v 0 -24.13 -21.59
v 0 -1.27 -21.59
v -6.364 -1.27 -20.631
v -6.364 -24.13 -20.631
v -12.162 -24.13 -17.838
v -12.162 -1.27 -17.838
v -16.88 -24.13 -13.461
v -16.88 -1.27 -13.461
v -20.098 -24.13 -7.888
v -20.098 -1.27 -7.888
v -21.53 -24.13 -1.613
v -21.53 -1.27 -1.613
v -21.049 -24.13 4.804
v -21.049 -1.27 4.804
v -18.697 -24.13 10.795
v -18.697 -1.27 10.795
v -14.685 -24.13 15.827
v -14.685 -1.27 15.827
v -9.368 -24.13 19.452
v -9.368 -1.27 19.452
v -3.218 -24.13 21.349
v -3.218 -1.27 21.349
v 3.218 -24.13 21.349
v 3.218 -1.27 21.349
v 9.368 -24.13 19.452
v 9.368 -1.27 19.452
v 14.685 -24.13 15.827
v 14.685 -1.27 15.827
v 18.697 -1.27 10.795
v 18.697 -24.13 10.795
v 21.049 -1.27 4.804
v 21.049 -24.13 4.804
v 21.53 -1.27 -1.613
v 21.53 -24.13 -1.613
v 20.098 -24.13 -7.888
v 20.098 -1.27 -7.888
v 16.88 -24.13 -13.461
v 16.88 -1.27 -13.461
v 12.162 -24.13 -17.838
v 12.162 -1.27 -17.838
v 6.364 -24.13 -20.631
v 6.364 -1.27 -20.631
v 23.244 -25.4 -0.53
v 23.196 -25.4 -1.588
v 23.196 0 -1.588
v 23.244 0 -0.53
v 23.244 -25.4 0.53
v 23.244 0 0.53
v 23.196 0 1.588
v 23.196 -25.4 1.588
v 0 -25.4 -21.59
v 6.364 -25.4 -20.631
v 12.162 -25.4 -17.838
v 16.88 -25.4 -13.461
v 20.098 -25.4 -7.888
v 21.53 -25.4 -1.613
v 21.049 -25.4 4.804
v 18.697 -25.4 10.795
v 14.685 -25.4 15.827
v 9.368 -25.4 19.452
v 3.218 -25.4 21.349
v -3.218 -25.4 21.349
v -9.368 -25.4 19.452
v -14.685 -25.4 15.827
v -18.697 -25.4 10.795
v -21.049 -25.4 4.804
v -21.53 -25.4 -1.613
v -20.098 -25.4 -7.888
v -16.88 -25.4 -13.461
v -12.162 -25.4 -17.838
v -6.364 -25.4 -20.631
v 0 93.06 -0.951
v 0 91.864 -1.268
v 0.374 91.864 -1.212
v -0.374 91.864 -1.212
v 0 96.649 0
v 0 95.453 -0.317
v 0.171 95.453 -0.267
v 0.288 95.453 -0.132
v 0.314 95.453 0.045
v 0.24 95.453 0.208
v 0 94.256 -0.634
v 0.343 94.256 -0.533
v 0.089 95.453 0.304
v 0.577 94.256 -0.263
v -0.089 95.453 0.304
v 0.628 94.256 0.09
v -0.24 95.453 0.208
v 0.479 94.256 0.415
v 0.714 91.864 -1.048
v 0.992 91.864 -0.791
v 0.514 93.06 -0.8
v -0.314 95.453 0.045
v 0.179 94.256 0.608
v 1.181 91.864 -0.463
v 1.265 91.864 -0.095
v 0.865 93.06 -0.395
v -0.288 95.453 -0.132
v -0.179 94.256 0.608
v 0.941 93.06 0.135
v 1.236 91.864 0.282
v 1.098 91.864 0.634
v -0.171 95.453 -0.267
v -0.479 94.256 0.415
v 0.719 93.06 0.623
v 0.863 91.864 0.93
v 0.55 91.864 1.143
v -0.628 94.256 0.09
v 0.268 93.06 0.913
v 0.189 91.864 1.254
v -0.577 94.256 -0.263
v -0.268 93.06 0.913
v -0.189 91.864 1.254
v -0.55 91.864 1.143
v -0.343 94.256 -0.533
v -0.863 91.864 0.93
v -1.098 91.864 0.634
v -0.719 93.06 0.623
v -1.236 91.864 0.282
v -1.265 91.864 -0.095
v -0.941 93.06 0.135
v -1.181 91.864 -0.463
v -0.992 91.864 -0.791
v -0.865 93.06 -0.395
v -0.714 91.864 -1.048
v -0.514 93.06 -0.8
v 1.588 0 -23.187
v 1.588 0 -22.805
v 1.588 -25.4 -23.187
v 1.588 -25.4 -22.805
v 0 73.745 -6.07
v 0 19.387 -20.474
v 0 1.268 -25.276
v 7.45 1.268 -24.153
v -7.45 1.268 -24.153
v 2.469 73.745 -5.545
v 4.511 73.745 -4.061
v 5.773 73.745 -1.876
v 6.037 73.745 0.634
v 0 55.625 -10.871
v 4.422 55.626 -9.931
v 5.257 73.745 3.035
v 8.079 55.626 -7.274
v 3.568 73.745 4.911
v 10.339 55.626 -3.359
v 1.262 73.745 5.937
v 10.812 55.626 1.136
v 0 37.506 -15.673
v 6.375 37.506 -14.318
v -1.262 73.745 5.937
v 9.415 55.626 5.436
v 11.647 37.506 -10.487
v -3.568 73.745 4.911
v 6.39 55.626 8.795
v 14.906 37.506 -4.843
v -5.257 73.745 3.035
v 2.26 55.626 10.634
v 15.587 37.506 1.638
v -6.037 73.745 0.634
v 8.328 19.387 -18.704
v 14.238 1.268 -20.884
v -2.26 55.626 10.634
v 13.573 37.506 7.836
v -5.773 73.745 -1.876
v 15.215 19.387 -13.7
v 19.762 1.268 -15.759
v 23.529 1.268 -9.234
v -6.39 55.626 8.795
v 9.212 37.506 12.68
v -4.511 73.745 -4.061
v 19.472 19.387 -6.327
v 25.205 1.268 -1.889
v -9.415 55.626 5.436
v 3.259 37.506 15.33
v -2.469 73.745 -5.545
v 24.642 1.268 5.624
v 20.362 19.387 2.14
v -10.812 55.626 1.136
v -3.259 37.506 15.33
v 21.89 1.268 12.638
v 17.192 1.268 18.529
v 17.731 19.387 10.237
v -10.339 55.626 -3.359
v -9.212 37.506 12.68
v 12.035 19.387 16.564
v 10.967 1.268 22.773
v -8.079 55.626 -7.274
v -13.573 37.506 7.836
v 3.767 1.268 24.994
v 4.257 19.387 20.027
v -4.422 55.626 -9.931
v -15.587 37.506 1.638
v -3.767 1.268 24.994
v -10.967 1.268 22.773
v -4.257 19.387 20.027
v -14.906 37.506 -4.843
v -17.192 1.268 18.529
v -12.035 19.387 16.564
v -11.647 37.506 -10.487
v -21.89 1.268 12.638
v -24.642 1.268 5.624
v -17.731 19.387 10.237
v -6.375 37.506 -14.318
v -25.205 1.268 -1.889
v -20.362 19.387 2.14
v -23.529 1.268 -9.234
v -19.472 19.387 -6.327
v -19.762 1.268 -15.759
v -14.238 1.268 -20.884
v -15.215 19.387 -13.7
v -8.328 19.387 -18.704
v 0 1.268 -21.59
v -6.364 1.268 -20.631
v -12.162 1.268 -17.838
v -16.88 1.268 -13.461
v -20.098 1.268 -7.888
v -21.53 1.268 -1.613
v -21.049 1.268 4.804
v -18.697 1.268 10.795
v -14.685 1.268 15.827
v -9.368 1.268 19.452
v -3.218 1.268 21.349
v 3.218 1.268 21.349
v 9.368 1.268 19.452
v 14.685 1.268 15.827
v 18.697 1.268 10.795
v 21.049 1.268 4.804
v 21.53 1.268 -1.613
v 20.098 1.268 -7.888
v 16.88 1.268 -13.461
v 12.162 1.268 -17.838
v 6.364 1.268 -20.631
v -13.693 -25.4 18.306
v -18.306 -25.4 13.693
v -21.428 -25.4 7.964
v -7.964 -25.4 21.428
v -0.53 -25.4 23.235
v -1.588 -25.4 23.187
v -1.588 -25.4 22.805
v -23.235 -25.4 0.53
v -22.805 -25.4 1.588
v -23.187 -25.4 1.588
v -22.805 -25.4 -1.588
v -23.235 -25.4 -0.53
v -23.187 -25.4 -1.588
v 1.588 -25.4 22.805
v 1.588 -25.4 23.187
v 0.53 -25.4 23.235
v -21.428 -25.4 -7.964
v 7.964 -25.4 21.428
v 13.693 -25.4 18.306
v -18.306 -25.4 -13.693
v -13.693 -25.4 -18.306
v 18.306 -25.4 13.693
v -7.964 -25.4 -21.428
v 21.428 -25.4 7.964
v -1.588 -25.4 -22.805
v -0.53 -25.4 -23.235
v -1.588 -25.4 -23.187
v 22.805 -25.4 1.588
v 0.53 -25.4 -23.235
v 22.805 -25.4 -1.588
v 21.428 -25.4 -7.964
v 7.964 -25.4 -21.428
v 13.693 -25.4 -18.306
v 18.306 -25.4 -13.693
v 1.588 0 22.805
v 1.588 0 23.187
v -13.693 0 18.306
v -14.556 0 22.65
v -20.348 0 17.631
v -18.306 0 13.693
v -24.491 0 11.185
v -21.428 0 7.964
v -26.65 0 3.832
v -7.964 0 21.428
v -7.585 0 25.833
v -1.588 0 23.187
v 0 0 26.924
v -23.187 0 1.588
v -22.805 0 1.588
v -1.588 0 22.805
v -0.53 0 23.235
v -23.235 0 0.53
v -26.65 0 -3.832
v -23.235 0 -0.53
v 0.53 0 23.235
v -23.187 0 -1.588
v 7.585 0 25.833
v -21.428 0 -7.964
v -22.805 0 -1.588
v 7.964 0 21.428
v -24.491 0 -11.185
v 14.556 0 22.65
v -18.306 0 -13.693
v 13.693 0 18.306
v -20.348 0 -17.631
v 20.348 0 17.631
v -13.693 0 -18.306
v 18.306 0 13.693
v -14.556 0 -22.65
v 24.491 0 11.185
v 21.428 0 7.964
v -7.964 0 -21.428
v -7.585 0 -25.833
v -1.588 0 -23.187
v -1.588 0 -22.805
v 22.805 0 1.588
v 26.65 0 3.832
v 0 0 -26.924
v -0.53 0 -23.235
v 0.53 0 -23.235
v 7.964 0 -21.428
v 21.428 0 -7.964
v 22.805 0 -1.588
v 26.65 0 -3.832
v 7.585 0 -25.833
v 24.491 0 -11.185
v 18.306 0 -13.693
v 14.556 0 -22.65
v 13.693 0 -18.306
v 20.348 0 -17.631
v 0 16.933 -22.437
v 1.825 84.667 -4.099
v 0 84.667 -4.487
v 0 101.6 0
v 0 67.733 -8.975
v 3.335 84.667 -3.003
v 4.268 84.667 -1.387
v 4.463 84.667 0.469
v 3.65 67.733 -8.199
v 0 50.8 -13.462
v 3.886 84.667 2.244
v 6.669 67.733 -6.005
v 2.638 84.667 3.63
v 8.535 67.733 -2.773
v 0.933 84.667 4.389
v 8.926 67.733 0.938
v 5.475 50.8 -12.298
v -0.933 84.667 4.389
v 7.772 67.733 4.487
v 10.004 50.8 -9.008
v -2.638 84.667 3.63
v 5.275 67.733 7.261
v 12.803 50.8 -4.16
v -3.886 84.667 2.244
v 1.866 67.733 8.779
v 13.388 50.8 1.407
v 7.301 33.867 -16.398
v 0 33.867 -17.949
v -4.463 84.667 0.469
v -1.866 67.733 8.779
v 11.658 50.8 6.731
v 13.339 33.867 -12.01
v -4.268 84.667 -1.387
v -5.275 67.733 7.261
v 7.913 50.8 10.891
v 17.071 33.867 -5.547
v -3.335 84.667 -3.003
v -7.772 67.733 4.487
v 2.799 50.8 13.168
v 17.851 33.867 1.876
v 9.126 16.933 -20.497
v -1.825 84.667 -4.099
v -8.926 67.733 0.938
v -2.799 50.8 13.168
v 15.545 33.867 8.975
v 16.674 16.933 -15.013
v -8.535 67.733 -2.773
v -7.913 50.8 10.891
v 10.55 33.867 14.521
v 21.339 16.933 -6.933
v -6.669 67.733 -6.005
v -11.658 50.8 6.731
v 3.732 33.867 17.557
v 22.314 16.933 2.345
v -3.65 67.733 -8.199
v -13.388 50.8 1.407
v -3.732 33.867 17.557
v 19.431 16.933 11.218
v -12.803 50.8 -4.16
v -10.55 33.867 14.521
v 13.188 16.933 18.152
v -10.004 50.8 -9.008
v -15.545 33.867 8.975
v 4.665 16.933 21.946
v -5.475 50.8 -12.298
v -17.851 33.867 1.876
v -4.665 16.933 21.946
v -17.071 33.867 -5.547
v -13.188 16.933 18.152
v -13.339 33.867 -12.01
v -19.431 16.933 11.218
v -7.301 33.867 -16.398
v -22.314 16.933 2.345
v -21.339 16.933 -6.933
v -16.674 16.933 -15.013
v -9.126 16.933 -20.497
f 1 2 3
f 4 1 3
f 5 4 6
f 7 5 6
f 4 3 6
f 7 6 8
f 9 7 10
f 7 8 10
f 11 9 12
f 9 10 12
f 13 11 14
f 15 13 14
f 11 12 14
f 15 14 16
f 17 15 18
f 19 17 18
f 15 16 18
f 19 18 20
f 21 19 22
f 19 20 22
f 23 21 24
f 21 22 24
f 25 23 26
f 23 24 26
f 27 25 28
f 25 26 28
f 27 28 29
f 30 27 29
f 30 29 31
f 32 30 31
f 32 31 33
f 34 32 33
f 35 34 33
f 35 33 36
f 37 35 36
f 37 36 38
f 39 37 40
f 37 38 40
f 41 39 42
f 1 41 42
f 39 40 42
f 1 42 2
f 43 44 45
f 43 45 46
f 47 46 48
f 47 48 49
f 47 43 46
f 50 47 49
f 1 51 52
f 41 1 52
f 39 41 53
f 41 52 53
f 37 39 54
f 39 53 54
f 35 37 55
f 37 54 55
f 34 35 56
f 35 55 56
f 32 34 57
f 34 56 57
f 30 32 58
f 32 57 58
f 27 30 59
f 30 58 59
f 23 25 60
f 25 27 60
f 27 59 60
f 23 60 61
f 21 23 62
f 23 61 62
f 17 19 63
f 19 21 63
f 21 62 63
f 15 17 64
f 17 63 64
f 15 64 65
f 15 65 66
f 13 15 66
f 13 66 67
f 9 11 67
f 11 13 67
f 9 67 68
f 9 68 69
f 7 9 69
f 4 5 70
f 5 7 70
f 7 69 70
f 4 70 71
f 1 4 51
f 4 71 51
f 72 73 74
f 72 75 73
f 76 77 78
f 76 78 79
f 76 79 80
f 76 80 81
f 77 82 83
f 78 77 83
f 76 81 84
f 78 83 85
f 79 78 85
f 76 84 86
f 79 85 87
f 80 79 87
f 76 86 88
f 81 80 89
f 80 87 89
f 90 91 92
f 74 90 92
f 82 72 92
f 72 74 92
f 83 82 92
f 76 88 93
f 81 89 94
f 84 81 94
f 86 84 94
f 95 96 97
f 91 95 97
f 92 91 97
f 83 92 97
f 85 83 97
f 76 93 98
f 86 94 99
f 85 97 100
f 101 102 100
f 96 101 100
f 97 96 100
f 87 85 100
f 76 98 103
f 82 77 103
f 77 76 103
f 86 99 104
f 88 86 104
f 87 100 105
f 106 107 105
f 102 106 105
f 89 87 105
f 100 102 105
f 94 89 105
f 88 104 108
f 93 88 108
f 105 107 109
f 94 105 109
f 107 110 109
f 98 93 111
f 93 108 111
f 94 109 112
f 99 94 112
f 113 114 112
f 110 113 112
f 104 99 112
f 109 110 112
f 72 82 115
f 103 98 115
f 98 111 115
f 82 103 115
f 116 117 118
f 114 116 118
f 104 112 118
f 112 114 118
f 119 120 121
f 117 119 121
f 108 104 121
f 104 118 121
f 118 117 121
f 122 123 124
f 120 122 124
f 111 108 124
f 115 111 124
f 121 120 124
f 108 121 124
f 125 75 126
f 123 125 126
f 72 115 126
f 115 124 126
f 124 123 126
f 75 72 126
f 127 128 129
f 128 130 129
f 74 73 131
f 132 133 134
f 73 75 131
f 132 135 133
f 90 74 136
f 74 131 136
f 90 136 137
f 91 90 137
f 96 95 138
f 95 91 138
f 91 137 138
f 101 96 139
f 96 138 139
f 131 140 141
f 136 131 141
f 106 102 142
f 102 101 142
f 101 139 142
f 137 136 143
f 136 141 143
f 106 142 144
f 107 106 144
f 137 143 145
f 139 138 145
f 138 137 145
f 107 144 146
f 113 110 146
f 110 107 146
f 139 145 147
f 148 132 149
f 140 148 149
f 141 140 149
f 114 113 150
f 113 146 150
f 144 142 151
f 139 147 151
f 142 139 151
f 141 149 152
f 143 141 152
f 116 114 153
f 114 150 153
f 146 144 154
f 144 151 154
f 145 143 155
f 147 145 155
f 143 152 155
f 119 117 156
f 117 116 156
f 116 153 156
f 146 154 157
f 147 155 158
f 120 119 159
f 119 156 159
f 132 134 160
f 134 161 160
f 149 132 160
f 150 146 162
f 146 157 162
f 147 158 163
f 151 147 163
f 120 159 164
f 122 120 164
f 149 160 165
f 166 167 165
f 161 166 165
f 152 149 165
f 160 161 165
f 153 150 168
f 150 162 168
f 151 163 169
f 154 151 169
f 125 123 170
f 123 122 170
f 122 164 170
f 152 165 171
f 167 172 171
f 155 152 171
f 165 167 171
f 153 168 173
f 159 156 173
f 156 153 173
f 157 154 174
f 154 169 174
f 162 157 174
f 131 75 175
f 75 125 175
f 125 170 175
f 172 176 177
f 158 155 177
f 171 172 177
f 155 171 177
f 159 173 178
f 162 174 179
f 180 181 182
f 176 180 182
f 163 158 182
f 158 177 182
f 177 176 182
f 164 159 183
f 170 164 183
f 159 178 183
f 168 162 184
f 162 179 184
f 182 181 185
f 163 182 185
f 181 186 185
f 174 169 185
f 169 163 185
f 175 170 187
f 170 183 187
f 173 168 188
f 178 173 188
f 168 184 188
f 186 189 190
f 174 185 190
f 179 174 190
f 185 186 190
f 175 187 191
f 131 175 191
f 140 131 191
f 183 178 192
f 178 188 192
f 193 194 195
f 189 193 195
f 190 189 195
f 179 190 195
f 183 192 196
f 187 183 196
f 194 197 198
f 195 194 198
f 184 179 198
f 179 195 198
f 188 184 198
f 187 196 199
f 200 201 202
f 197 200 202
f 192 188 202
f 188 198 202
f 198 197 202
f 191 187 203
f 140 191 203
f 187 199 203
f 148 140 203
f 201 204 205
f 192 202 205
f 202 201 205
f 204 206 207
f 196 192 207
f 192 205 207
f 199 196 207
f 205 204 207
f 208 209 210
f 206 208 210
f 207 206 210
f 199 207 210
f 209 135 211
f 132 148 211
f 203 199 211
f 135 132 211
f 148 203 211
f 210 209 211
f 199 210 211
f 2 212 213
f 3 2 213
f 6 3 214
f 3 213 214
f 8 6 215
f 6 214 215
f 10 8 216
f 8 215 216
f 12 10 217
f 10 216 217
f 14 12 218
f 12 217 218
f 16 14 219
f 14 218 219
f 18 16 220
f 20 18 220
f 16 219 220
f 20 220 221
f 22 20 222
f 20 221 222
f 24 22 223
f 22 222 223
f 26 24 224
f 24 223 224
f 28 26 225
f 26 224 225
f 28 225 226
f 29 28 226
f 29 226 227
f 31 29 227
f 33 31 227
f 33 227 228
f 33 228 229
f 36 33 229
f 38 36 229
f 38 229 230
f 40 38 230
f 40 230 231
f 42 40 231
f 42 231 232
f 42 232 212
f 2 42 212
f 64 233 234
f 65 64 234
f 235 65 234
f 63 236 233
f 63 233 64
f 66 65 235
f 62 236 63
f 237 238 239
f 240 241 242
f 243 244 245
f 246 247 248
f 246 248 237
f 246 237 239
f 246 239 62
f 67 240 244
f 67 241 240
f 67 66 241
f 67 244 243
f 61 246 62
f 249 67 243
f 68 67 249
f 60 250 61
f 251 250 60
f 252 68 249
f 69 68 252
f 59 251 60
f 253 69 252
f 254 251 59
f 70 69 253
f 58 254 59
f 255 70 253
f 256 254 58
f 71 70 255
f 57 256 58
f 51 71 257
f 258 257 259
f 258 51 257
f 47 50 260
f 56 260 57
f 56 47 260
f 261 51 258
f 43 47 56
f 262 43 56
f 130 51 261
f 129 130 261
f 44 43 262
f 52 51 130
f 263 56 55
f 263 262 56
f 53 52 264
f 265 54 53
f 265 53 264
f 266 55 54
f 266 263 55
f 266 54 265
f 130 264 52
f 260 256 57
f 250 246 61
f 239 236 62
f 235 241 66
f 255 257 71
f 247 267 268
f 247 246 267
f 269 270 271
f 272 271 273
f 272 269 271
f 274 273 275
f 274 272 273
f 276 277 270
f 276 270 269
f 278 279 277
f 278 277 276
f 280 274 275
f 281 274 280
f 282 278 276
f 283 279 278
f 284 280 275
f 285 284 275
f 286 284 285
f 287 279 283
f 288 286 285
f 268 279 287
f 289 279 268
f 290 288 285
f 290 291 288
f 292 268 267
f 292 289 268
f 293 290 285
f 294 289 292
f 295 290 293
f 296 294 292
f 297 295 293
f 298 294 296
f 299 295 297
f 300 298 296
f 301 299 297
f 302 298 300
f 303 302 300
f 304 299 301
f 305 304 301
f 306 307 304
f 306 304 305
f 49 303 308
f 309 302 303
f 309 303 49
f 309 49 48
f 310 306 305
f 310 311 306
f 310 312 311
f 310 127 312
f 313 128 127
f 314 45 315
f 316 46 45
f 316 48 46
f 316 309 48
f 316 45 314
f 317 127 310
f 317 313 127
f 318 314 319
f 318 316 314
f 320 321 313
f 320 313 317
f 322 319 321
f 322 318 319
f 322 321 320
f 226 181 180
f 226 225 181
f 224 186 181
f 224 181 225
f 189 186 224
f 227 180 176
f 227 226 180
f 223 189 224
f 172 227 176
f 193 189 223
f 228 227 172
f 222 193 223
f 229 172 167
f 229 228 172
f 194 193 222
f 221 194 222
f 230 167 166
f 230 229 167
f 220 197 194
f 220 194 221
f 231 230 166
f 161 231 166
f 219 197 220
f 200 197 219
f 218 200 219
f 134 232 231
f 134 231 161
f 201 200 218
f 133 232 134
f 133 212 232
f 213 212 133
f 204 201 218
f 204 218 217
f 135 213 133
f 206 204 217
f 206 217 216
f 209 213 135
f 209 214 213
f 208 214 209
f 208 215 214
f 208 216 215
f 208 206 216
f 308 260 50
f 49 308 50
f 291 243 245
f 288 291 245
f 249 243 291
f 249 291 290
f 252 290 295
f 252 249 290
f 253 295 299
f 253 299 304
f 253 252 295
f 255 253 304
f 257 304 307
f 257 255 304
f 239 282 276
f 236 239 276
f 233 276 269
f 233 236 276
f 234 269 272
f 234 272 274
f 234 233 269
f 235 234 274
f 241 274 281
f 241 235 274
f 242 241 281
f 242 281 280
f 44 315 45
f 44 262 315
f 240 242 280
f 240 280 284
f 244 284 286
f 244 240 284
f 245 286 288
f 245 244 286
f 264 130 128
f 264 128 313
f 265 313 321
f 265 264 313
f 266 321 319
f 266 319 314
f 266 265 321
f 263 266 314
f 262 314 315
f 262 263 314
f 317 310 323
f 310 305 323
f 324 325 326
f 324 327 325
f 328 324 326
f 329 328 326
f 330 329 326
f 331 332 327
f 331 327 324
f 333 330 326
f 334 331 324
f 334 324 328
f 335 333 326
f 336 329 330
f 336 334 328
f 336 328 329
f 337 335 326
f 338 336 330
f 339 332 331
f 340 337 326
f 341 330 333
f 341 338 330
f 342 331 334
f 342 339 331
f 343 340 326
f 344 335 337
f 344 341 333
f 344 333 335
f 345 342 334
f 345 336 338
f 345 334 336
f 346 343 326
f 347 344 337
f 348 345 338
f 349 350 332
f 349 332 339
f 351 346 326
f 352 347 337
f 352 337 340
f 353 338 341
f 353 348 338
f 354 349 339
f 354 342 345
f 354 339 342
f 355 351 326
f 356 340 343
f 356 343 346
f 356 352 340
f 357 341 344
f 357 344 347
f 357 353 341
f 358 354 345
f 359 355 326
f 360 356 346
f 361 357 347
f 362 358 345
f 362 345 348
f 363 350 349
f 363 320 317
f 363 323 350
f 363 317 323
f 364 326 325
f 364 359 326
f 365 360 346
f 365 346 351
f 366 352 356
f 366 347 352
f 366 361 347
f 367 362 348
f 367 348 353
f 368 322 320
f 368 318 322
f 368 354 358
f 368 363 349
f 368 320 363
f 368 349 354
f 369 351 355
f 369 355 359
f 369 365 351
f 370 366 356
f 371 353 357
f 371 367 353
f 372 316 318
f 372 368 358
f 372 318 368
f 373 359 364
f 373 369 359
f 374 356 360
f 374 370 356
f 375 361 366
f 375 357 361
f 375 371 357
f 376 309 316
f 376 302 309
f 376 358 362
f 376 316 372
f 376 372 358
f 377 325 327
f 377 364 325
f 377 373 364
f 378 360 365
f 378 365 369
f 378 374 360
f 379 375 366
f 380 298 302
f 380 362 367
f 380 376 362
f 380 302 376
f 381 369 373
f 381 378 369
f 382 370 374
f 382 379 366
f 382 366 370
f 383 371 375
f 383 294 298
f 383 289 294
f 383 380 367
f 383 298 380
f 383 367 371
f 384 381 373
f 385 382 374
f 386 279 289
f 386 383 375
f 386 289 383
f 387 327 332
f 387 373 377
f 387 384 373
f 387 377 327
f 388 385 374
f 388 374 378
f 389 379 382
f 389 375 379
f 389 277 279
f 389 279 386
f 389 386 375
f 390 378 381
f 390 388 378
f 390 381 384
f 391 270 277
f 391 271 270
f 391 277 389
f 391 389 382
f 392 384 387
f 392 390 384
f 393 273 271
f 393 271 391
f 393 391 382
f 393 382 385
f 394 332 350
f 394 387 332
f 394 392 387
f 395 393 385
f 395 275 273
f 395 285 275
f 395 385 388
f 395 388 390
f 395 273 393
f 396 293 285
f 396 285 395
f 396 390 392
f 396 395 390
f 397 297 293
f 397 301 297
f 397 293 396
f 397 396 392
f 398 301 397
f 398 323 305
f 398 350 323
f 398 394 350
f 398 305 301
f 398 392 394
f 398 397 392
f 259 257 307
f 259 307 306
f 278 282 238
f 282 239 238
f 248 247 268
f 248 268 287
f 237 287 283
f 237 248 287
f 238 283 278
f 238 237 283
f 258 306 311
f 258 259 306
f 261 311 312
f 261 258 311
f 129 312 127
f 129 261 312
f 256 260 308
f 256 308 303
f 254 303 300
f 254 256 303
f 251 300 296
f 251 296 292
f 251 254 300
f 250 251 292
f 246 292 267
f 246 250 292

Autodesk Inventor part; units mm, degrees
ref_plane "YZ Plane" through (0, 0, 0) normal (1, 0, 0) x (0, 1, 0)
ref_plane "XZ Plane" through (0, 0, 0) normal (0, 1, 0) x (-1, 0, 0)
ref_plane "XY Plane" through (0, 0, 0) normal (0, 0, 1) x (1, 0, 0)
sketch "Sketch1" plane through (0, 0, 0) normal (1, 0, 0) x (0, 1, 0)
  line L0 (0, -22.86) -> (-25.4, -22.86)
  line L1 (-25.4, -22.86) -> (-25.4, 0)
  line L2 (-25.4, 0) -> (0, 0)
  line L3 (101.6, 0) -> (0, -26.924)
  line L4 (101.6, 0) -> (0, 0)
  line L5 (1.2682, -25.276) -> (91.8637, -1.2682)
  line L6 (-24.13, -21.59) -> (-1.27, -21.59)
  line L7 (-1.27, -21.59) -> (1.2682, -21.59)
  line L8 (-24.13, -21.59) -> (-25.4, -21.59)
  line L9 (91.8637, -1.2682) -> (96.6492, 0)
  line L10 (1.2682, -21.59) -> (1.2682, -25.276)
  line L11 (0, -26.924) -> (0, -22.86)
  dimension "d27" = 1.27
revolve "Revolution1" add sketch "Sketch1" angle 360 about axis through (0, 101.6, 0) along (0, -1, 0) contours L0 L1 L8 L6 L7 L10 L5 L9 L4 L3 L11
revolve "Revolution2" add sketch "Sketch1" angle 360 about axis through (0, -25.4, 0) along (0, 1, 0) contours L1 L2 L4 L9 L5 L10 L7 L6 L8
sketch "Sketch2" plane through (0, -25.4, 0) normal (0, -1, 0) x (1, 0, 0)
  line L0 (0, 0) -> (22.86, 0)
  circle A0 centre (0, 0) radius 22.86 projected
  arc A1 (23.1962, -1.5875) -> (23.1962, 1.5875) centre (0, 0) ccw
  line L1 (22.8048, 1.5875) -> (23.1962, 1.5875)
  line L2 (22.8048, -1.5875) -> (23.1962, -1.5875)
  line L3 (0, -22.86) -> (1.5875, -22.86)
  line L4 (0, -22.86) -> (1.5875, -22.86) construction
  line L5 (0, -22.86) -> (-1.5875, -22.86)
  circle A2 centre (0, 0) radius 23.241
  line L6 (-1.5875, -22.8048) -> (-1.5875, -23.1867)
  line L7 (1.5875, -22.8048) -> (1.5875, -23.1867)
  line L8 (-22.86, 0) -> (-22.86, -1.5875)
  line L9 (-22.86, 0) -> (-22.86, 1.5875)
  line L10 (-22.8048, 1.5875) -> (-23.1867, 1.5875)
  line L11 (-22.8048, -1.5875) -> (-23.1867, -1.5875)
  line L12 (0, 22.86) -> (1.5875, 22.86)
  line L13 (0, 22.86) -> (1.5875, 22.86) construction
  line L14 (0, 22.86) -> (-1.5875, 22.86)
  line L15 (0, 22.86) -> (1.5875, 22.86) construction
  line L16 (-1.5875, 22.8048) -> (-1.5875, 23.1867)
  line L17 (1.5875, 22.8048) -> (1.5875, 23.1867)
  dimension "d14" = 1.5875
  dimension "d16" = 1.5875
  dimension "d17" = 0.381
  dimension "d18" = 1.5875
  dimension "d19" = 1.5875
  dimension "d21" = 1.5875
  dimension "d22" = 0
  dimension "d23" = 1.5875
  dimension "d24" = 180
extrude "Extrusion1" add sketch "Sketch2" against normal blind 25.4 contours A0 L1 A2 L2 | A0 L12 L17 | L1 A1 L2 A2 | L7 L3 A0 | L14 L16 A2 L17 L12 | A0 L16 L14 | L5 L6 A0 | L3 L7 A2 L6 L5 | A0 L9 L10 | L10 L9 L8 L11 A2 | L11 L8 A0
revolve "Revolution3" cut sketch "Sketch1" angle 360 about axis through (0, -25.4, 0) along (0, 1, 0) contours L1 L2 L4 L9 L5 L10 L7 L6 L8
revolve "Revolution4" cut sketch "Sketch1" angle 360 about axis through (0, 101.6, 0) along (0, -1, 0) contours L1 L2 L4 L9 L5 L10 L7 L6 L8
properties part number "Nose Cone MK I"
